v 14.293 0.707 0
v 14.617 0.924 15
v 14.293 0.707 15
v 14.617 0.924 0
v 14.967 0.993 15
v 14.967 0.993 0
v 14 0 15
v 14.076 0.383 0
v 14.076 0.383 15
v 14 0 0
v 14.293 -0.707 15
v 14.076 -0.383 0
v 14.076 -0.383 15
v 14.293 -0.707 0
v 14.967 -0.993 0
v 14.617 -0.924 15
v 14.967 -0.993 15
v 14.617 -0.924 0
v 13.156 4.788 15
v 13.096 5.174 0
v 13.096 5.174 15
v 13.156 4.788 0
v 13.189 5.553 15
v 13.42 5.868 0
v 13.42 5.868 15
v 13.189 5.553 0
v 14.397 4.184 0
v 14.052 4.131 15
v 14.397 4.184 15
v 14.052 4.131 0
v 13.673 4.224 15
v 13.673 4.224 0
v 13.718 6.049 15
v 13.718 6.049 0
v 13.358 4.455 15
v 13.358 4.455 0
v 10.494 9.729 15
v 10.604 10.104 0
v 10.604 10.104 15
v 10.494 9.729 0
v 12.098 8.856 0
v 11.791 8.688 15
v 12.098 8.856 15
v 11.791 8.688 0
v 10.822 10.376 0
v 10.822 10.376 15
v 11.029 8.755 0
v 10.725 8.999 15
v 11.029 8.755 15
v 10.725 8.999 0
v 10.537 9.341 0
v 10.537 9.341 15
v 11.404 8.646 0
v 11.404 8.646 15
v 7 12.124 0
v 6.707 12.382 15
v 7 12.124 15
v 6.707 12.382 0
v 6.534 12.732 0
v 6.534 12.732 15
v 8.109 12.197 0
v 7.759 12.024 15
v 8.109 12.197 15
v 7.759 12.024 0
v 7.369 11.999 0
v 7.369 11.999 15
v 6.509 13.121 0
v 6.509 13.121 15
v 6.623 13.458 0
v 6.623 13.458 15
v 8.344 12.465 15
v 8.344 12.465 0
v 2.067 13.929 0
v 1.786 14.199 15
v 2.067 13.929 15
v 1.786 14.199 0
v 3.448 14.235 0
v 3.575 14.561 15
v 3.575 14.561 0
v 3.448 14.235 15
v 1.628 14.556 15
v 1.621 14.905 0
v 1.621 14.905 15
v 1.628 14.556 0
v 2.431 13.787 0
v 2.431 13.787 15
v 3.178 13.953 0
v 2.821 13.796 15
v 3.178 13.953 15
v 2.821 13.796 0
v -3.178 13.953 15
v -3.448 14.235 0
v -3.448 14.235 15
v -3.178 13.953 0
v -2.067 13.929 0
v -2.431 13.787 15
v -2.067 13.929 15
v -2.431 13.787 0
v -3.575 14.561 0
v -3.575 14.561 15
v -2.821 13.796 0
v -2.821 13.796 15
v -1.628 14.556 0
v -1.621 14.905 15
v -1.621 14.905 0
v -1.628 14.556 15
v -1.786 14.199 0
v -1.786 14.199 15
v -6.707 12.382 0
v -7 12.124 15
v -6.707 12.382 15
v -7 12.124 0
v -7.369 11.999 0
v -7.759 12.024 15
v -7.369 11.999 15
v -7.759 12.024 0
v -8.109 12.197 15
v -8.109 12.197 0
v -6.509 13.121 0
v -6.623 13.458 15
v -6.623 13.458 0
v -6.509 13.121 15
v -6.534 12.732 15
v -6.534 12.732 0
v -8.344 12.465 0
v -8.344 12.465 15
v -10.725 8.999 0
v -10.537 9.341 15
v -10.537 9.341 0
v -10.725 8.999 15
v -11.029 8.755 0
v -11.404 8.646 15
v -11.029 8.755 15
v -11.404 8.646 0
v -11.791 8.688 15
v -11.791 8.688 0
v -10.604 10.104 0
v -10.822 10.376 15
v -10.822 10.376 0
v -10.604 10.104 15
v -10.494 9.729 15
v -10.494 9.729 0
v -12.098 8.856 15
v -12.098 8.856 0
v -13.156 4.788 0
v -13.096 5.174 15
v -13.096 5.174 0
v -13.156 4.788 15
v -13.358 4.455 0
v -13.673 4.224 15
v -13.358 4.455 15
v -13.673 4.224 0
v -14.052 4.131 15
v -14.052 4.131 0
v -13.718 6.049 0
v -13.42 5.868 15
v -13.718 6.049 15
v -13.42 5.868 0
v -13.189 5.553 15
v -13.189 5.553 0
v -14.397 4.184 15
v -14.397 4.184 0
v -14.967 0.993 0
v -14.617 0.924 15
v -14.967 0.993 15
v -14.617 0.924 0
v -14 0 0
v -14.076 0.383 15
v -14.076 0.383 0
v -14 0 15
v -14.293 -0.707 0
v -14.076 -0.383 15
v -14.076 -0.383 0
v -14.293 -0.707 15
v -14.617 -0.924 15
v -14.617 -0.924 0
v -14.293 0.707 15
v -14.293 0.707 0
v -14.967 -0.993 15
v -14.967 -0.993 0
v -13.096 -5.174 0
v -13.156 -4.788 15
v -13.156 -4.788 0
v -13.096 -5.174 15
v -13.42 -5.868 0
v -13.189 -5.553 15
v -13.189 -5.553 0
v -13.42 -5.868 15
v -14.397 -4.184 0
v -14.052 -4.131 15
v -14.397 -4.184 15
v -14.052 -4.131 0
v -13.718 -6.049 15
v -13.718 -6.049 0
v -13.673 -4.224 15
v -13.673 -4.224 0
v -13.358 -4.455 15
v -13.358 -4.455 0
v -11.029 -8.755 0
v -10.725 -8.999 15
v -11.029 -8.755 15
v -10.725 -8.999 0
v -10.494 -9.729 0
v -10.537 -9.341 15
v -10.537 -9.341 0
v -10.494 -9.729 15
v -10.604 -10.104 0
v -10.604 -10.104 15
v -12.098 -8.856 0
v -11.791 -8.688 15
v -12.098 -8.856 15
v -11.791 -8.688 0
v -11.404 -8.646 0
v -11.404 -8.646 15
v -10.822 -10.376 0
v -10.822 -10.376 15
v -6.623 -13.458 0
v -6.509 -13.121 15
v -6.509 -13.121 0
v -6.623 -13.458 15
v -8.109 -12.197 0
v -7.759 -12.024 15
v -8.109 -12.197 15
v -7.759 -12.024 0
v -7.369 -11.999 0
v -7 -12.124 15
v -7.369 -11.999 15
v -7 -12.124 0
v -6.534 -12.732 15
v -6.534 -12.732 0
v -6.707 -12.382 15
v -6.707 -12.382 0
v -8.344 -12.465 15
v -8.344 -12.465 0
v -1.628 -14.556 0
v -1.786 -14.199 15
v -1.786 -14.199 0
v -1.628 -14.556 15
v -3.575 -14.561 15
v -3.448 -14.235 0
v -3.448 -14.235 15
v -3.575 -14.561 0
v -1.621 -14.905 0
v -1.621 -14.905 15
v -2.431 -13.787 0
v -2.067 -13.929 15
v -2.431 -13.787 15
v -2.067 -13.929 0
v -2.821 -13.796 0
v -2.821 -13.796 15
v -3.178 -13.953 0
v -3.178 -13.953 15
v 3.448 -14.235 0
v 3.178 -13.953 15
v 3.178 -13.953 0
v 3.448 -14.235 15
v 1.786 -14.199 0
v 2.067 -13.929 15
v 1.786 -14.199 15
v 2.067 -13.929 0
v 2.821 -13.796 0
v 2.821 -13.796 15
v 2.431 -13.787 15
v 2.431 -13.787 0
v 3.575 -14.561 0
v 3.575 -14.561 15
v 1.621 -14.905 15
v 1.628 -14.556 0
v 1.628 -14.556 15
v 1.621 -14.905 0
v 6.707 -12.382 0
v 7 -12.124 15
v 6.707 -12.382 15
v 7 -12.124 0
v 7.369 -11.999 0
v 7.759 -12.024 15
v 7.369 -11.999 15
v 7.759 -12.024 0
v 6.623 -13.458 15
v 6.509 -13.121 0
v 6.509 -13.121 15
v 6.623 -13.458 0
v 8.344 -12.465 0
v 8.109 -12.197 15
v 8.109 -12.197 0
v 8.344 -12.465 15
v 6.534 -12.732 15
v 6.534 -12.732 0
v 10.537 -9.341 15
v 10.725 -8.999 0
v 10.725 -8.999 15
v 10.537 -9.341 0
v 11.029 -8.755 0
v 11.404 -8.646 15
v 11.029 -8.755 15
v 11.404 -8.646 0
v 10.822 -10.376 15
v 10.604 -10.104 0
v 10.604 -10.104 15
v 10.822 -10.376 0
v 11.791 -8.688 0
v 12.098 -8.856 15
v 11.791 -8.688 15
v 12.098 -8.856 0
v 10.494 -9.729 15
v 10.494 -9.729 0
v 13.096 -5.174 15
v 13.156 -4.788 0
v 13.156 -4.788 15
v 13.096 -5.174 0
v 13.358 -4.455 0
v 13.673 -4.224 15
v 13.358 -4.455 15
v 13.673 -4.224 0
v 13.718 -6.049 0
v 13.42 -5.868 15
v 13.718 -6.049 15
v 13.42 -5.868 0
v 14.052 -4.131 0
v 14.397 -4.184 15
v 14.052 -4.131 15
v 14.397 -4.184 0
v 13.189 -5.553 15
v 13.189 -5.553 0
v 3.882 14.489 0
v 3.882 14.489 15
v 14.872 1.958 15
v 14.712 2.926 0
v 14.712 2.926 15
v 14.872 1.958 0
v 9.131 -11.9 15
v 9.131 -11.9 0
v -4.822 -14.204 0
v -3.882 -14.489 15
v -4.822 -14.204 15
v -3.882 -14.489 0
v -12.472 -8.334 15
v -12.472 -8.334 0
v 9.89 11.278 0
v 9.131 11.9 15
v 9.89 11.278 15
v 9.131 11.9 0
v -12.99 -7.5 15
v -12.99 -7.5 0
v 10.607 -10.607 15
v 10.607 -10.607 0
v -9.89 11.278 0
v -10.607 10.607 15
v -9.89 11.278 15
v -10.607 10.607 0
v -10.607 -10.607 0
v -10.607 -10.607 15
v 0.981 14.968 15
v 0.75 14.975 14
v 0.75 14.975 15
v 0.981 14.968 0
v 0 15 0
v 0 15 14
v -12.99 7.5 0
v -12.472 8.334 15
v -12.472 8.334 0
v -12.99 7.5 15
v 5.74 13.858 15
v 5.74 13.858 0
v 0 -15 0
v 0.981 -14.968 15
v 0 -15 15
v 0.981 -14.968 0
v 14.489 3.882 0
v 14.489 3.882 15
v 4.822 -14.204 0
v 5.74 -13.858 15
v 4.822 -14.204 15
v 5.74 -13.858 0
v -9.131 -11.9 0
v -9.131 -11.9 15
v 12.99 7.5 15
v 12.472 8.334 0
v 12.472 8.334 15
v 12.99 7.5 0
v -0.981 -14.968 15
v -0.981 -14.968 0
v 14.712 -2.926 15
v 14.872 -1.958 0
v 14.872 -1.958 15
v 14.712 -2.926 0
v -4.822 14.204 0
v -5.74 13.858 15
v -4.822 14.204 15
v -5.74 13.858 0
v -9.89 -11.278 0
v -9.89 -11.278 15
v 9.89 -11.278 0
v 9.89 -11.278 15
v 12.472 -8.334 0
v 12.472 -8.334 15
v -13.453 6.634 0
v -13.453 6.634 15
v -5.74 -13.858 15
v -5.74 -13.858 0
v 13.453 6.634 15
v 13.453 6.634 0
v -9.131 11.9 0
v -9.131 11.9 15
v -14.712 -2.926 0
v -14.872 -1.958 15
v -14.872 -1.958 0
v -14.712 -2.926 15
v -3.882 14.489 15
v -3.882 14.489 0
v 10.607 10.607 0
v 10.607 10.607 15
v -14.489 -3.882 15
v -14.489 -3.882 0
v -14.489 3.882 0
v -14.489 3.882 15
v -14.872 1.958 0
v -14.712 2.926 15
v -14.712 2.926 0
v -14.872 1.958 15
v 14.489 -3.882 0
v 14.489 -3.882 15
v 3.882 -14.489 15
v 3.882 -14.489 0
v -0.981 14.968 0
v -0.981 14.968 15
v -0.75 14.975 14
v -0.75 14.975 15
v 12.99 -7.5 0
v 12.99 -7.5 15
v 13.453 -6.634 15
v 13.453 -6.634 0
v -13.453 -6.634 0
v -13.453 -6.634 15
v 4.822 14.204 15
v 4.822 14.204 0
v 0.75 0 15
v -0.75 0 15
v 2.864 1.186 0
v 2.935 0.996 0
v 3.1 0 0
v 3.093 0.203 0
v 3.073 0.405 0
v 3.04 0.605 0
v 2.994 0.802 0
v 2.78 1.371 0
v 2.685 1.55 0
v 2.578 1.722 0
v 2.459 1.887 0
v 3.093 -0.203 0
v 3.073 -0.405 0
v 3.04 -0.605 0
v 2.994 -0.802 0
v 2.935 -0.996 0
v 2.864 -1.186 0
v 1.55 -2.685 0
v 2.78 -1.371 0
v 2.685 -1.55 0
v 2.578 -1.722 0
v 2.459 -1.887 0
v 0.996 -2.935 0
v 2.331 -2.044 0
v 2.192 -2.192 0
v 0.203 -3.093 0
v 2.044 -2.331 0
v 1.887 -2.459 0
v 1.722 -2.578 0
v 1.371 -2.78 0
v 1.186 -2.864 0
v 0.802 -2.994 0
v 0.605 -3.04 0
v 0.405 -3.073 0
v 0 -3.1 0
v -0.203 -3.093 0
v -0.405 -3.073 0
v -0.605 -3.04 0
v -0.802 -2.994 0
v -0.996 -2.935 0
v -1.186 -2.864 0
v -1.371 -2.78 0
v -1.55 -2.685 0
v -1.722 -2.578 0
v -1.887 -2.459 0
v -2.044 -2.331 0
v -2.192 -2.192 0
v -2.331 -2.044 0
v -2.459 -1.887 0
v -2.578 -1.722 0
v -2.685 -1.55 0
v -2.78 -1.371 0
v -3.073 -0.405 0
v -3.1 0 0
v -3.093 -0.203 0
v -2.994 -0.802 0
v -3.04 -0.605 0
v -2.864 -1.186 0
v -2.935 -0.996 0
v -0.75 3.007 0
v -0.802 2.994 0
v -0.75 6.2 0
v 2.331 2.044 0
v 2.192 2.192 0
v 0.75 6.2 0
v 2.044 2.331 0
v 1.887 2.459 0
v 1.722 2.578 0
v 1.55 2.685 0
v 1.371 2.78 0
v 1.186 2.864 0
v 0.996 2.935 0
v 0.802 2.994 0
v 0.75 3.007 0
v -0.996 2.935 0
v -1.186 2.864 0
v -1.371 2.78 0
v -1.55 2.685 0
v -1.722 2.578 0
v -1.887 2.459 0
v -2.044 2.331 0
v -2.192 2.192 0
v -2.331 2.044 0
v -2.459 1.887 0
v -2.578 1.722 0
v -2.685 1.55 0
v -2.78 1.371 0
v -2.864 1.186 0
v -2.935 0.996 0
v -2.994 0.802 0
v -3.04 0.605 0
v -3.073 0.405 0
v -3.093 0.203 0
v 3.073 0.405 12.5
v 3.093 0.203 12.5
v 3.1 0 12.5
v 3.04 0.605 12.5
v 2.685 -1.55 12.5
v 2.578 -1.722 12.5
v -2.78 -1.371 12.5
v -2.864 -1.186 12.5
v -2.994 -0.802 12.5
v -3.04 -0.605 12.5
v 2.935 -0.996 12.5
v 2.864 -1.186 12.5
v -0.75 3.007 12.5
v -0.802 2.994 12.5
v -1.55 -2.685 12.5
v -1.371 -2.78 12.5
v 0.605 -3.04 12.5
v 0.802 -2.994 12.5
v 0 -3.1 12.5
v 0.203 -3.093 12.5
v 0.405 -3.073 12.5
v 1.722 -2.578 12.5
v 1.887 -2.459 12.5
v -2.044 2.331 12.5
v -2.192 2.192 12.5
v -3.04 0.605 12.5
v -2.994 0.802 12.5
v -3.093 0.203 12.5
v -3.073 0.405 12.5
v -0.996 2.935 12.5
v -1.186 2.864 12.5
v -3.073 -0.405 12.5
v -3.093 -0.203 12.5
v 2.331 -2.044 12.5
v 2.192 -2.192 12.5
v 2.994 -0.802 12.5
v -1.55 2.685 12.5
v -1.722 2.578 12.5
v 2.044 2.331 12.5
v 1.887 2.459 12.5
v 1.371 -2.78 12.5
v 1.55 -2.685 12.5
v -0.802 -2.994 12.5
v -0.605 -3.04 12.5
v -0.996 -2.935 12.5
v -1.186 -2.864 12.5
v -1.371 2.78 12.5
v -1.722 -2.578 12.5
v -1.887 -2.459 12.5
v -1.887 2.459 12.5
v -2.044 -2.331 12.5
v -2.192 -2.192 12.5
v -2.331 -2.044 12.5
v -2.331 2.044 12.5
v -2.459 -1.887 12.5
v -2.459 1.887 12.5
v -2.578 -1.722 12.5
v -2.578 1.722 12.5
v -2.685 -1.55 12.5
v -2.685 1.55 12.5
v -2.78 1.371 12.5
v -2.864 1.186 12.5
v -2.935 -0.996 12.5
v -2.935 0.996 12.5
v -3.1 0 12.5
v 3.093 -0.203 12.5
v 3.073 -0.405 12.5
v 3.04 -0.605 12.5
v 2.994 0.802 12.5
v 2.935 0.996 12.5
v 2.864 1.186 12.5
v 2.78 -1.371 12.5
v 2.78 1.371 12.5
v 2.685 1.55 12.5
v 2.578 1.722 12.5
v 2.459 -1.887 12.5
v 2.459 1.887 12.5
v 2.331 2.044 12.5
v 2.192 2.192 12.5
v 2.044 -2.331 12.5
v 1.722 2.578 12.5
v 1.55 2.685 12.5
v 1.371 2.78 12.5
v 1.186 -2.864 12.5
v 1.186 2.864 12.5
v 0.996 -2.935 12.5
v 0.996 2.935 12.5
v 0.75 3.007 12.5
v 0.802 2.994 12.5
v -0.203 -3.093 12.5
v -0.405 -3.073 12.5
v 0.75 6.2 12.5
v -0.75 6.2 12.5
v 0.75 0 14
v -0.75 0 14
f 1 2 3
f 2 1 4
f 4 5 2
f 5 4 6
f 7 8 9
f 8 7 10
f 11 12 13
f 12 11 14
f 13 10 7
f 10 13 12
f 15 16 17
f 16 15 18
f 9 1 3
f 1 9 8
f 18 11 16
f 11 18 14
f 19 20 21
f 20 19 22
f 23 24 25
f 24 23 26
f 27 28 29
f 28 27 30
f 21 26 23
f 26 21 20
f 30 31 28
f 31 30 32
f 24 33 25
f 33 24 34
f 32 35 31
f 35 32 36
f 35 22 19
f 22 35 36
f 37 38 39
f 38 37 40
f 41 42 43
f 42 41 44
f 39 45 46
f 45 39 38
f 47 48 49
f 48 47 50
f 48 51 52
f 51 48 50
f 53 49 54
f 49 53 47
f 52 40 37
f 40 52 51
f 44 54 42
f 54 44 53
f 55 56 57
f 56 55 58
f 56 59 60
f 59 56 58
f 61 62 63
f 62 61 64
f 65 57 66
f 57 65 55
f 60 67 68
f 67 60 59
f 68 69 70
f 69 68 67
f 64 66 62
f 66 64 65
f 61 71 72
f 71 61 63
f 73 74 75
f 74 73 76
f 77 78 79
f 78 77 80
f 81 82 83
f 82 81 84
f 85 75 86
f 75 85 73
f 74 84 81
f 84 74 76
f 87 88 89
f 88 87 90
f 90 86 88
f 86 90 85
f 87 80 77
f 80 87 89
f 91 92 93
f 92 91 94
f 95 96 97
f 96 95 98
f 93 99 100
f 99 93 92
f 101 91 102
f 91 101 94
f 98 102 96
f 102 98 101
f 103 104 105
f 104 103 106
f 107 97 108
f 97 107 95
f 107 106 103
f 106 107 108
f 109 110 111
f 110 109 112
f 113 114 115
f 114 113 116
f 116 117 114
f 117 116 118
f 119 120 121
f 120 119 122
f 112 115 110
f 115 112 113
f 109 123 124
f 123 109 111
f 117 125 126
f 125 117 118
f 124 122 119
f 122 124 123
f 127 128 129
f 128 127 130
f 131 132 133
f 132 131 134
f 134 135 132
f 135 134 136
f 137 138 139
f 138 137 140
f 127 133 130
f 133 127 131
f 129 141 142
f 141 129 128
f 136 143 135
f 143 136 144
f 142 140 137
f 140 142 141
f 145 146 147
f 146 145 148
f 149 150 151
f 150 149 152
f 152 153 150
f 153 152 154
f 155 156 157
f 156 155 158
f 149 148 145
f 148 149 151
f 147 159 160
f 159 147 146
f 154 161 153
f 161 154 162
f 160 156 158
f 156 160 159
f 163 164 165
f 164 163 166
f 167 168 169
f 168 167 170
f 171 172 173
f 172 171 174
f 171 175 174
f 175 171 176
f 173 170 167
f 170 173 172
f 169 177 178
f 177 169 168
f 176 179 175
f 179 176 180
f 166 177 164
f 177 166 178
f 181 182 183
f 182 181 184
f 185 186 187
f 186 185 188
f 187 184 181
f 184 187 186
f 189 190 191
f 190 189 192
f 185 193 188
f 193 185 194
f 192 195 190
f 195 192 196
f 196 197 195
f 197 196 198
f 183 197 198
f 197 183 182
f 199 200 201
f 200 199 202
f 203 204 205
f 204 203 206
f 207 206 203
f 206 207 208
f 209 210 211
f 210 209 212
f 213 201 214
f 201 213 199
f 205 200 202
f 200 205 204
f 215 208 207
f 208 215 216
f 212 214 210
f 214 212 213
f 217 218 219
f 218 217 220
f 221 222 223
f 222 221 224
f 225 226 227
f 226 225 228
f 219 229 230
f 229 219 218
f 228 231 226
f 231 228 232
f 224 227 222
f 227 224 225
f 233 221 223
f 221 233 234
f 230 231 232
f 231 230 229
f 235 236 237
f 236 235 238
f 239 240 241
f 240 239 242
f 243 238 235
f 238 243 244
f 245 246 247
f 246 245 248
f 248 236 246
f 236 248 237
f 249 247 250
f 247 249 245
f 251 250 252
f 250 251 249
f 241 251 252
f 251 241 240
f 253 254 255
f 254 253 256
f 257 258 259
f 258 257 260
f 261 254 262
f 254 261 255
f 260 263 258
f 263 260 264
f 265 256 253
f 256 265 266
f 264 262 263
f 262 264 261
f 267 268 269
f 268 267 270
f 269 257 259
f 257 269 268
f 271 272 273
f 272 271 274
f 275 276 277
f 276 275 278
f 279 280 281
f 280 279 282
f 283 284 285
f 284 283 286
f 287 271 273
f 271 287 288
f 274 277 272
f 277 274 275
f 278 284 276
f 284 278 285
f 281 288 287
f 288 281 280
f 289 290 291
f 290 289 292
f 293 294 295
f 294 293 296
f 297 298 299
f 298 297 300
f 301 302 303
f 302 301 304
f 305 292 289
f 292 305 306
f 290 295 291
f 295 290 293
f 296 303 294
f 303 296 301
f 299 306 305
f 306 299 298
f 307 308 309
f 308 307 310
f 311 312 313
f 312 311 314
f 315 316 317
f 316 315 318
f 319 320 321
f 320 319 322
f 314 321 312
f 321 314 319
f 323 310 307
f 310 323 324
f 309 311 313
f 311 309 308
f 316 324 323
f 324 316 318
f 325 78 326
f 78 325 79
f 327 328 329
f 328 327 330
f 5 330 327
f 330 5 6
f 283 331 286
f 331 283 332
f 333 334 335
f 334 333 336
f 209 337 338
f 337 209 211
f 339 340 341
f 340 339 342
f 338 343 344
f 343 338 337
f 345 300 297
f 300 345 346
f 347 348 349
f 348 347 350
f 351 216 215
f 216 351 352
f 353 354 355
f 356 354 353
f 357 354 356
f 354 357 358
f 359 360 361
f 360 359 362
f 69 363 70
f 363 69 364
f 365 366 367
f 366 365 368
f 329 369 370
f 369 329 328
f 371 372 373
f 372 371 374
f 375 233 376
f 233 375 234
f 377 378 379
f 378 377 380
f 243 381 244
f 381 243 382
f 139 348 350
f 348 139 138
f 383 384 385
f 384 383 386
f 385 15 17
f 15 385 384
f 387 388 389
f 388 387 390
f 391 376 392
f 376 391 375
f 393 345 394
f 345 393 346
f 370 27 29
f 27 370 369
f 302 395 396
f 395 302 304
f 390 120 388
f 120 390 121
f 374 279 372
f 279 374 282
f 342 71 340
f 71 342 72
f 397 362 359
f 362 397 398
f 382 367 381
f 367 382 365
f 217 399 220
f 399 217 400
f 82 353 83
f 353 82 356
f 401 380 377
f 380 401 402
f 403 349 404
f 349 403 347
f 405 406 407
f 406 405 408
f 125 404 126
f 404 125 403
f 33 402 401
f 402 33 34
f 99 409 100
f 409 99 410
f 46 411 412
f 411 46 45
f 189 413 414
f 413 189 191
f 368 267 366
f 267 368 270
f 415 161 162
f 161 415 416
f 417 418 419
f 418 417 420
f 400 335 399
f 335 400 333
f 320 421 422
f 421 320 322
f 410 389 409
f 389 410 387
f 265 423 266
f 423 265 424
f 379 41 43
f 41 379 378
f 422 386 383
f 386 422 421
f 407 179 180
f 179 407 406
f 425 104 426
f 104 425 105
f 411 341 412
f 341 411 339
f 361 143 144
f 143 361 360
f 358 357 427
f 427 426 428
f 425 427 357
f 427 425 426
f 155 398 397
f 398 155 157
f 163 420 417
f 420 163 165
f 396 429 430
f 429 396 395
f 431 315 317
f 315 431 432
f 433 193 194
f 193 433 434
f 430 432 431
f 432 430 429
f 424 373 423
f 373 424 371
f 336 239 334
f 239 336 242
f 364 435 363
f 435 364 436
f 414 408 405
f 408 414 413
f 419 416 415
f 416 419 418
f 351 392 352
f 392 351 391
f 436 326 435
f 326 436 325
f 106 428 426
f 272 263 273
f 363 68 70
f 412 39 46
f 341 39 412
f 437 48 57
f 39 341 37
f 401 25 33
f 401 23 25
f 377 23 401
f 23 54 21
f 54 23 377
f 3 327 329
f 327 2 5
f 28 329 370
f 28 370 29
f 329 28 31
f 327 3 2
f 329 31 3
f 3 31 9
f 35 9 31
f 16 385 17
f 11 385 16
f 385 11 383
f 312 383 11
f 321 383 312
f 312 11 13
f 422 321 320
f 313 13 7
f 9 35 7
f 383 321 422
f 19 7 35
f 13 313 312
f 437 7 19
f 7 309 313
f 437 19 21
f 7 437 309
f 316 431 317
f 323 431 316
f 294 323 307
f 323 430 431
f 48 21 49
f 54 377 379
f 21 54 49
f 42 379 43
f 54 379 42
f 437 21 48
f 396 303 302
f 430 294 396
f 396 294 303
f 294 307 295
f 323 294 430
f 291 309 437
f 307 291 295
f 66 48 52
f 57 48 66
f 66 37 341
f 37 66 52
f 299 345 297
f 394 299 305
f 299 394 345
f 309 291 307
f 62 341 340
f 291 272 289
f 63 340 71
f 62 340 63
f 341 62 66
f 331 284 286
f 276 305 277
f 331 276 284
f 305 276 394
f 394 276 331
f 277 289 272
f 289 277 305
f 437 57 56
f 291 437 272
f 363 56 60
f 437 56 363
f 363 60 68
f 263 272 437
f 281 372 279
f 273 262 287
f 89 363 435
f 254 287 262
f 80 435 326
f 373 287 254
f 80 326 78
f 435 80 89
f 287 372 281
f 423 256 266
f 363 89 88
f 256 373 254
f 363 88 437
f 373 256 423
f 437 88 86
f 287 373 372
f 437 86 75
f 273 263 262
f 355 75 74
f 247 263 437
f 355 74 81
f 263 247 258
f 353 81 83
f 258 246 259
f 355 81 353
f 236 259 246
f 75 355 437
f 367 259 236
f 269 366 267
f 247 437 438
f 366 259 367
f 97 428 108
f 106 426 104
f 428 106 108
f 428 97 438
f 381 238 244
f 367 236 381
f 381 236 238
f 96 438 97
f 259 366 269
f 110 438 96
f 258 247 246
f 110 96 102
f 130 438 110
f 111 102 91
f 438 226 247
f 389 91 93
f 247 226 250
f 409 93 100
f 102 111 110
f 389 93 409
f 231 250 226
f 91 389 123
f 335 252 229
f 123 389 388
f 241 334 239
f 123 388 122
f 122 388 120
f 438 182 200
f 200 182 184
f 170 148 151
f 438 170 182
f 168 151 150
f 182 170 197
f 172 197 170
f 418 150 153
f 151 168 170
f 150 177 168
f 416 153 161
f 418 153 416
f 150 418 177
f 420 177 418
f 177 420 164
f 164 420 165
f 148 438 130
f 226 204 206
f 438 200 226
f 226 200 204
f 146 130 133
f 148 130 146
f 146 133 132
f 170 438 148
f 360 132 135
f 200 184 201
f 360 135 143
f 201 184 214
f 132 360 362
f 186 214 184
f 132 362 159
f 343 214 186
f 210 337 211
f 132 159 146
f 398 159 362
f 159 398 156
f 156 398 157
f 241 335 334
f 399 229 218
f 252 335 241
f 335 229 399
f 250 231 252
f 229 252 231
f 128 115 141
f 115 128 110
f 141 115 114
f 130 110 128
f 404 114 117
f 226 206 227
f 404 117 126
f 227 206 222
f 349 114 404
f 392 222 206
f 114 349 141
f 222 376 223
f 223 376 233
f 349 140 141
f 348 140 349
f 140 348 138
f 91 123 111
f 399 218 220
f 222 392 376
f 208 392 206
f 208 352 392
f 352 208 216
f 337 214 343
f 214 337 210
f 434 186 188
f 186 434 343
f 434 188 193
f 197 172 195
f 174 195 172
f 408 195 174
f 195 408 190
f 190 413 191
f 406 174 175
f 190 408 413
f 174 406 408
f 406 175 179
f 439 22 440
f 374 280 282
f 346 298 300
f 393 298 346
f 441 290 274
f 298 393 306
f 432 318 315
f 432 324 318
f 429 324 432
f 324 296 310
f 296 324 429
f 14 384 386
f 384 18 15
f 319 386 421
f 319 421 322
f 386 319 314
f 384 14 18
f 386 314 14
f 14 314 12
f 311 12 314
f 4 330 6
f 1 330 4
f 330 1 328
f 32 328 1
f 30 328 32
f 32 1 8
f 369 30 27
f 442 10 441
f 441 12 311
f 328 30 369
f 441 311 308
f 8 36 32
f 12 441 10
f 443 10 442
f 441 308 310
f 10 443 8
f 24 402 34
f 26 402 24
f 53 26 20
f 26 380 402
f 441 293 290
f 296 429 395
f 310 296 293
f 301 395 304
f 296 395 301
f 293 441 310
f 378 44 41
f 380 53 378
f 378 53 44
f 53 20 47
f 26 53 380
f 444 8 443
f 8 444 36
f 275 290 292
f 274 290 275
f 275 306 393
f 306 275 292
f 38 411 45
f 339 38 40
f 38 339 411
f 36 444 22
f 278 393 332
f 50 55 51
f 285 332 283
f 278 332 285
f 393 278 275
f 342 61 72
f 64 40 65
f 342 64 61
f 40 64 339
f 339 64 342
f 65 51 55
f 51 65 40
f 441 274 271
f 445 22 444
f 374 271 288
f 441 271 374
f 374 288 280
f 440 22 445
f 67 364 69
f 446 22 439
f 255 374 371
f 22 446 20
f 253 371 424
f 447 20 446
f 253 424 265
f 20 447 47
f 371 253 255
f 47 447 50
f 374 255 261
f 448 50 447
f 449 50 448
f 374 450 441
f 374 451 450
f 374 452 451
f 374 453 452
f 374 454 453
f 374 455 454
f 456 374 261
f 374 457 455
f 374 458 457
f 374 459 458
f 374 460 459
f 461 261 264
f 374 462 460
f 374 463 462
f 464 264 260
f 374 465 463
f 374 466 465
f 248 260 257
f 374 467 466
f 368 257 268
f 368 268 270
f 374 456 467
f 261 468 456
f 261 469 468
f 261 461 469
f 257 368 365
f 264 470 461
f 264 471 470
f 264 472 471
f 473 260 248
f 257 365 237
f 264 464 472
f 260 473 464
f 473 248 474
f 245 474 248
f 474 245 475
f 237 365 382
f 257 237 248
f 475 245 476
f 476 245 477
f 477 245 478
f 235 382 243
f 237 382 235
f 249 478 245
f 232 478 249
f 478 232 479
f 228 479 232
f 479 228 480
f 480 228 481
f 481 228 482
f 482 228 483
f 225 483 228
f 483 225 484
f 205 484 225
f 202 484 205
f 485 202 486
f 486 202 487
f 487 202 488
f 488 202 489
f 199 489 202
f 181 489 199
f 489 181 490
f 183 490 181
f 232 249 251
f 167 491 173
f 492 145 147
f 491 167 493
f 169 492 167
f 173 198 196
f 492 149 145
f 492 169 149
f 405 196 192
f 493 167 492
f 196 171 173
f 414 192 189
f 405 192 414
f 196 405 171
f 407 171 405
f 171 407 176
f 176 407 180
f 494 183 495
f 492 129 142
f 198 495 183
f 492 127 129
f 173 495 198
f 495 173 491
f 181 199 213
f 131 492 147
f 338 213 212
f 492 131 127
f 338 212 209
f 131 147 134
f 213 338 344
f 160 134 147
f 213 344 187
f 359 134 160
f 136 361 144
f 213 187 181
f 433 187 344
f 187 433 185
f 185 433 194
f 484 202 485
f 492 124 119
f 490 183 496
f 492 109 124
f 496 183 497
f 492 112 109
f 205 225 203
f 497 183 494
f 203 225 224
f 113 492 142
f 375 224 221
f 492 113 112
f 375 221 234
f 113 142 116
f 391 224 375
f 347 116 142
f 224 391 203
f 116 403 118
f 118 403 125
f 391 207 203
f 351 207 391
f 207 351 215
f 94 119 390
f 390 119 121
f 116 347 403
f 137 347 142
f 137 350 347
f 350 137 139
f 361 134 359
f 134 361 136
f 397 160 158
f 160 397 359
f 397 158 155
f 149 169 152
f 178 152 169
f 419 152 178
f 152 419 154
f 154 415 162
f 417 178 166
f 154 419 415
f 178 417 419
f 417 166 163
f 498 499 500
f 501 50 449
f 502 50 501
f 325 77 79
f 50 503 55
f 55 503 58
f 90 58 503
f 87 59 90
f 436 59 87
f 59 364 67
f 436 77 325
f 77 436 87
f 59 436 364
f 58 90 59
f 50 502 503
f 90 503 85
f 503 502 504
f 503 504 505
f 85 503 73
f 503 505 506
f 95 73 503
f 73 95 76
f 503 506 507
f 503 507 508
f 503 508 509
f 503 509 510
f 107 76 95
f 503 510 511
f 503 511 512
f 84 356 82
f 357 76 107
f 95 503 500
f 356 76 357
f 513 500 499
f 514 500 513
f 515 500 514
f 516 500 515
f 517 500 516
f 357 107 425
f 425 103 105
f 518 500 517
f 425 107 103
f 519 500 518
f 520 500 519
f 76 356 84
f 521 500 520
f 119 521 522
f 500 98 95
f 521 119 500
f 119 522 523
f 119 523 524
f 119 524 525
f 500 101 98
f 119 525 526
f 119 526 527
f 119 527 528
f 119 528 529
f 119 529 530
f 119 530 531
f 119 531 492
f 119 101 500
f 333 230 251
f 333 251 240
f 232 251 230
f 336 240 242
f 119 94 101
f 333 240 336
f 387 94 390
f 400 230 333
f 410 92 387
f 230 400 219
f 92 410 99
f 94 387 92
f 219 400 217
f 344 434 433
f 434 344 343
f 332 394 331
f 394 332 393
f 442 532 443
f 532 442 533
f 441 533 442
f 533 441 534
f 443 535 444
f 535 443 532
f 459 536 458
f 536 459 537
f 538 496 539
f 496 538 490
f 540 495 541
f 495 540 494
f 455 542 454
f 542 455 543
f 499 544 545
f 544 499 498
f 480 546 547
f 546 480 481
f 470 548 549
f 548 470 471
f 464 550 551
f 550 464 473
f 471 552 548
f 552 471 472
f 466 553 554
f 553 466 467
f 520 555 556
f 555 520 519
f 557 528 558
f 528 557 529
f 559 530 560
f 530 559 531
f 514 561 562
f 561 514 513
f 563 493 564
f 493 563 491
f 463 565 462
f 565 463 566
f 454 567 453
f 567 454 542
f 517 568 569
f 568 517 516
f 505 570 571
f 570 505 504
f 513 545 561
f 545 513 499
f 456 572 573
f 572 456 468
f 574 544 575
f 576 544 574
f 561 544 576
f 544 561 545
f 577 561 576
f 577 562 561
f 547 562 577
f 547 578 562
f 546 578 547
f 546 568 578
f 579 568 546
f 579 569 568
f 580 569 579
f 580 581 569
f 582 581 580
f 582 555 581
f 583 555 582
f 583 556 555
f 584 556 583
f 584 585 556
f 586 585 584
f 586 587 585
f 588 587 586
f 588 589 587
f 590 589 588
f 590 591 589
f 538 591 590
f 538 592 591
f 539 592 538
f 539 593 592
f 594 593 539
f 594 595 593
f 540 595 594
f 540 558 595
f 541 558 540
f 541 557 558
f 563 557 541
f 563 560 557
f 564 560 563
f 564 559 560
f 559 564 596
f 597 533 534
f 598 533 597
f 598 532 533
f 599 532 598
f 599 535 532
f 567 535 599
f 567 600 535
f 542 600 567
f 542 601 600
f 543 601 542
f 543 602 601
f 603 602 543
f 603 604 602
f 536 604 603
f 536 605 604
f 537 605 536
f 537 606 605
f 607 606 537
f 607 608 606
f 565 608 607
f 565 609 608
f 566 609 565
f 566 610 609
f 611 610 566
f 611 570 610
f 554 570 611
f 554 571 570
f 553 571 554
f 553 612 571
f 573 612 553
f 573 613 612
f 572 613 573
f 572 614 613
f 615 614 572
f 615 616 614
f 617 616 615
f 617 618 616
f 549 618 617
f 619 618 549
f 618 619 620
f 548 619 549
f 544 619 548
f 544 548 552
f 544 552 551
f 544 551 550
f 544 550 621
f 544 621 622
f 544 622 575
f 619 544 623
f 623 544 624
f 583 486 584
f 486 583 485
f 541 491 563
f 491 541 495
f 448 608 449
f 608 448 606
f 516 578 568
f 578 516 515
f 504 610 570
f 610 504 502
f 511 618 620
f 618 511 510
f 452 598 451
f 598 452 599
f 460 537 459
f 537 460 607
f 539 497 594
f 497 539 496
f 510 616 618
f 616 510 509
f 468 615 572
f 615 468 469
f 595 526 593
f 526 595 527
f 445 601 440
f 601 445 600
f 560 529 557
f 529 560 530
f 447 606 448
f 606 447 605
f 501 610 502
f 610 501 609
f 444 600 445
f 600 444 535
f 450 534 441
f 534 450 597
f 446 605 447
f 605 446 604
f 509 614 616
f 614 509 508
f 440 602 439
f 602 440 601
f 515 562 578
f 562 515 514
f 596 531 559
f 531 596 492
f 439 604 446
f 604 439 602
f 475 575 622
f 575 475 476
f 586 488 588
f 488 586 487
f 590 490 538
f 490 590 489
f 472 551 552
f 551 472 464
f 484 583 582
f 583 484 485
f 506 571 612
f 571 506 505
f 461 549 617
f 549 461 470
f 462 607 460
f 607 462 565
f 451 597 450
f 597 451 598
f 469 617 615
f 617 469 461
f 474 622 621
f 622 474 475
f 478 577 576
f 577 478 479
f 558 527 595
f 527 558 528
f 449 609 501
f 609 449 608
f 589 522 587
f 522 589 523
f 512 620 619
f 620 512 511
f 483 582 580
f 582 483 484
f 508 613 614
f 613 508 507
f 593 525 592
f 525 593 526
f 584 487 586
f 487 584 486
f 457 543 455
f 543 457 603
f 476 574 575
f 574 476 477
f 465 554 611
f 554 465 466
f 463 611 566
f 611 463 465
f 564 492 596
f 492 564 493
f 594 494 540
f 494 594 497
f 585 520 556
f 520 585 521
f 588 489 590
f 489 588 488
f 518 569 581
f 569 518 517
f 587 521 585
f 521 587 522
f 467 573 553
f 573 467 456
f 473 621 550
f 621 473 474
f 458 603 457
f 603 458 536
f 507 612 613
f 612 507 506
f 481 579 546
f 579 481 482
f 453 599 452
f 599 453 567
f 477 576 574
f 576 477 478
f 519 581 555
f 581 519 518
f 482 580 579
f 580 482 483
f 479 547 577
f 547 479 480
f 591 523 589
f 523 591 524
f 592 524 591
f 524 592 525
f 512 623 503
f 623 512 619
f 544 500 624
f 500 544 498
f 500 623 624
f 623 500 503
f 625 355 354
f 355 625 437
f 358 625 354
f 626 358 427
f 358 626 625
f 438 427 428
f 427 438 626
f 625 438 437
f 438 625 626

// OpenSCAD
// Replacement knob for hotplate stirrer with D-shaft
// Print orientation: side facing hotplate down on bed (z = 0)

// ---------------- Parameters ----------------
knob_d          = 30;    // knob outer diameter
knob_h          = 15;    // knob height
shaft_d         = 6;     // D-shaft diameter
bore_depth      = 12;    // blind bore depth from bottom face
bore_flat       = 4.7;   // distance from D-bore flat to opposite side
bore_r          = 3.1;   // bore radius (6.2 mm / 2)
groove_count    = 18;    // number of grip grooves
groove_d        = 2;     // grip groove diameter
pointer_width   = 1.5;   // pointer groove width
pointer_depth   = 1;     // pointer groove depth
eps             = 0.5;   // cutter overshoot past faces
fn_curve        = 96;    // facets for curved shapes

// Derived
bore_d = 2 * bore_r;            // bore diameter from spec
pitch  = 360 / groove_count;  // angle between groove centres

// ---------------- Model ----------------
difference() {
    // Main knob body
    cylinder(d = knob_d, h = knob_h, $fn = fn_curve);

    // D-shaped blind bore from bottom face
    translate([0, 0, -eps])
        cylinder(d = bore_d, h = bore_depth + 2 * eps, $fn = fn_curve);

    // Flat on D-bore, cut from bottom face
    translate([-(bore_d - bore_flat) / 2, 0, -eps])
        cube([bore_d - bore_flat, bore_d, bore_depth + 2 * eps]);

    // Vertical grip grooves along full height
    for (i = [0 : groove_count - 1]) {
        rotate([0, 0, i * pitch])
            translate([knob_d / 2, 0, -eps])
                cylinder(d = groove_d, h = knob_h + 2 * eps, $fn = 16);
    }

    // Pointer groove on top face, same side as D-bore flat
    translate([-(bore_d - bore_flat) / 2, 0, knob_h - pointer_depth])
        cube([pointer_width, knob_d, pointer_depth + eps]);
}
